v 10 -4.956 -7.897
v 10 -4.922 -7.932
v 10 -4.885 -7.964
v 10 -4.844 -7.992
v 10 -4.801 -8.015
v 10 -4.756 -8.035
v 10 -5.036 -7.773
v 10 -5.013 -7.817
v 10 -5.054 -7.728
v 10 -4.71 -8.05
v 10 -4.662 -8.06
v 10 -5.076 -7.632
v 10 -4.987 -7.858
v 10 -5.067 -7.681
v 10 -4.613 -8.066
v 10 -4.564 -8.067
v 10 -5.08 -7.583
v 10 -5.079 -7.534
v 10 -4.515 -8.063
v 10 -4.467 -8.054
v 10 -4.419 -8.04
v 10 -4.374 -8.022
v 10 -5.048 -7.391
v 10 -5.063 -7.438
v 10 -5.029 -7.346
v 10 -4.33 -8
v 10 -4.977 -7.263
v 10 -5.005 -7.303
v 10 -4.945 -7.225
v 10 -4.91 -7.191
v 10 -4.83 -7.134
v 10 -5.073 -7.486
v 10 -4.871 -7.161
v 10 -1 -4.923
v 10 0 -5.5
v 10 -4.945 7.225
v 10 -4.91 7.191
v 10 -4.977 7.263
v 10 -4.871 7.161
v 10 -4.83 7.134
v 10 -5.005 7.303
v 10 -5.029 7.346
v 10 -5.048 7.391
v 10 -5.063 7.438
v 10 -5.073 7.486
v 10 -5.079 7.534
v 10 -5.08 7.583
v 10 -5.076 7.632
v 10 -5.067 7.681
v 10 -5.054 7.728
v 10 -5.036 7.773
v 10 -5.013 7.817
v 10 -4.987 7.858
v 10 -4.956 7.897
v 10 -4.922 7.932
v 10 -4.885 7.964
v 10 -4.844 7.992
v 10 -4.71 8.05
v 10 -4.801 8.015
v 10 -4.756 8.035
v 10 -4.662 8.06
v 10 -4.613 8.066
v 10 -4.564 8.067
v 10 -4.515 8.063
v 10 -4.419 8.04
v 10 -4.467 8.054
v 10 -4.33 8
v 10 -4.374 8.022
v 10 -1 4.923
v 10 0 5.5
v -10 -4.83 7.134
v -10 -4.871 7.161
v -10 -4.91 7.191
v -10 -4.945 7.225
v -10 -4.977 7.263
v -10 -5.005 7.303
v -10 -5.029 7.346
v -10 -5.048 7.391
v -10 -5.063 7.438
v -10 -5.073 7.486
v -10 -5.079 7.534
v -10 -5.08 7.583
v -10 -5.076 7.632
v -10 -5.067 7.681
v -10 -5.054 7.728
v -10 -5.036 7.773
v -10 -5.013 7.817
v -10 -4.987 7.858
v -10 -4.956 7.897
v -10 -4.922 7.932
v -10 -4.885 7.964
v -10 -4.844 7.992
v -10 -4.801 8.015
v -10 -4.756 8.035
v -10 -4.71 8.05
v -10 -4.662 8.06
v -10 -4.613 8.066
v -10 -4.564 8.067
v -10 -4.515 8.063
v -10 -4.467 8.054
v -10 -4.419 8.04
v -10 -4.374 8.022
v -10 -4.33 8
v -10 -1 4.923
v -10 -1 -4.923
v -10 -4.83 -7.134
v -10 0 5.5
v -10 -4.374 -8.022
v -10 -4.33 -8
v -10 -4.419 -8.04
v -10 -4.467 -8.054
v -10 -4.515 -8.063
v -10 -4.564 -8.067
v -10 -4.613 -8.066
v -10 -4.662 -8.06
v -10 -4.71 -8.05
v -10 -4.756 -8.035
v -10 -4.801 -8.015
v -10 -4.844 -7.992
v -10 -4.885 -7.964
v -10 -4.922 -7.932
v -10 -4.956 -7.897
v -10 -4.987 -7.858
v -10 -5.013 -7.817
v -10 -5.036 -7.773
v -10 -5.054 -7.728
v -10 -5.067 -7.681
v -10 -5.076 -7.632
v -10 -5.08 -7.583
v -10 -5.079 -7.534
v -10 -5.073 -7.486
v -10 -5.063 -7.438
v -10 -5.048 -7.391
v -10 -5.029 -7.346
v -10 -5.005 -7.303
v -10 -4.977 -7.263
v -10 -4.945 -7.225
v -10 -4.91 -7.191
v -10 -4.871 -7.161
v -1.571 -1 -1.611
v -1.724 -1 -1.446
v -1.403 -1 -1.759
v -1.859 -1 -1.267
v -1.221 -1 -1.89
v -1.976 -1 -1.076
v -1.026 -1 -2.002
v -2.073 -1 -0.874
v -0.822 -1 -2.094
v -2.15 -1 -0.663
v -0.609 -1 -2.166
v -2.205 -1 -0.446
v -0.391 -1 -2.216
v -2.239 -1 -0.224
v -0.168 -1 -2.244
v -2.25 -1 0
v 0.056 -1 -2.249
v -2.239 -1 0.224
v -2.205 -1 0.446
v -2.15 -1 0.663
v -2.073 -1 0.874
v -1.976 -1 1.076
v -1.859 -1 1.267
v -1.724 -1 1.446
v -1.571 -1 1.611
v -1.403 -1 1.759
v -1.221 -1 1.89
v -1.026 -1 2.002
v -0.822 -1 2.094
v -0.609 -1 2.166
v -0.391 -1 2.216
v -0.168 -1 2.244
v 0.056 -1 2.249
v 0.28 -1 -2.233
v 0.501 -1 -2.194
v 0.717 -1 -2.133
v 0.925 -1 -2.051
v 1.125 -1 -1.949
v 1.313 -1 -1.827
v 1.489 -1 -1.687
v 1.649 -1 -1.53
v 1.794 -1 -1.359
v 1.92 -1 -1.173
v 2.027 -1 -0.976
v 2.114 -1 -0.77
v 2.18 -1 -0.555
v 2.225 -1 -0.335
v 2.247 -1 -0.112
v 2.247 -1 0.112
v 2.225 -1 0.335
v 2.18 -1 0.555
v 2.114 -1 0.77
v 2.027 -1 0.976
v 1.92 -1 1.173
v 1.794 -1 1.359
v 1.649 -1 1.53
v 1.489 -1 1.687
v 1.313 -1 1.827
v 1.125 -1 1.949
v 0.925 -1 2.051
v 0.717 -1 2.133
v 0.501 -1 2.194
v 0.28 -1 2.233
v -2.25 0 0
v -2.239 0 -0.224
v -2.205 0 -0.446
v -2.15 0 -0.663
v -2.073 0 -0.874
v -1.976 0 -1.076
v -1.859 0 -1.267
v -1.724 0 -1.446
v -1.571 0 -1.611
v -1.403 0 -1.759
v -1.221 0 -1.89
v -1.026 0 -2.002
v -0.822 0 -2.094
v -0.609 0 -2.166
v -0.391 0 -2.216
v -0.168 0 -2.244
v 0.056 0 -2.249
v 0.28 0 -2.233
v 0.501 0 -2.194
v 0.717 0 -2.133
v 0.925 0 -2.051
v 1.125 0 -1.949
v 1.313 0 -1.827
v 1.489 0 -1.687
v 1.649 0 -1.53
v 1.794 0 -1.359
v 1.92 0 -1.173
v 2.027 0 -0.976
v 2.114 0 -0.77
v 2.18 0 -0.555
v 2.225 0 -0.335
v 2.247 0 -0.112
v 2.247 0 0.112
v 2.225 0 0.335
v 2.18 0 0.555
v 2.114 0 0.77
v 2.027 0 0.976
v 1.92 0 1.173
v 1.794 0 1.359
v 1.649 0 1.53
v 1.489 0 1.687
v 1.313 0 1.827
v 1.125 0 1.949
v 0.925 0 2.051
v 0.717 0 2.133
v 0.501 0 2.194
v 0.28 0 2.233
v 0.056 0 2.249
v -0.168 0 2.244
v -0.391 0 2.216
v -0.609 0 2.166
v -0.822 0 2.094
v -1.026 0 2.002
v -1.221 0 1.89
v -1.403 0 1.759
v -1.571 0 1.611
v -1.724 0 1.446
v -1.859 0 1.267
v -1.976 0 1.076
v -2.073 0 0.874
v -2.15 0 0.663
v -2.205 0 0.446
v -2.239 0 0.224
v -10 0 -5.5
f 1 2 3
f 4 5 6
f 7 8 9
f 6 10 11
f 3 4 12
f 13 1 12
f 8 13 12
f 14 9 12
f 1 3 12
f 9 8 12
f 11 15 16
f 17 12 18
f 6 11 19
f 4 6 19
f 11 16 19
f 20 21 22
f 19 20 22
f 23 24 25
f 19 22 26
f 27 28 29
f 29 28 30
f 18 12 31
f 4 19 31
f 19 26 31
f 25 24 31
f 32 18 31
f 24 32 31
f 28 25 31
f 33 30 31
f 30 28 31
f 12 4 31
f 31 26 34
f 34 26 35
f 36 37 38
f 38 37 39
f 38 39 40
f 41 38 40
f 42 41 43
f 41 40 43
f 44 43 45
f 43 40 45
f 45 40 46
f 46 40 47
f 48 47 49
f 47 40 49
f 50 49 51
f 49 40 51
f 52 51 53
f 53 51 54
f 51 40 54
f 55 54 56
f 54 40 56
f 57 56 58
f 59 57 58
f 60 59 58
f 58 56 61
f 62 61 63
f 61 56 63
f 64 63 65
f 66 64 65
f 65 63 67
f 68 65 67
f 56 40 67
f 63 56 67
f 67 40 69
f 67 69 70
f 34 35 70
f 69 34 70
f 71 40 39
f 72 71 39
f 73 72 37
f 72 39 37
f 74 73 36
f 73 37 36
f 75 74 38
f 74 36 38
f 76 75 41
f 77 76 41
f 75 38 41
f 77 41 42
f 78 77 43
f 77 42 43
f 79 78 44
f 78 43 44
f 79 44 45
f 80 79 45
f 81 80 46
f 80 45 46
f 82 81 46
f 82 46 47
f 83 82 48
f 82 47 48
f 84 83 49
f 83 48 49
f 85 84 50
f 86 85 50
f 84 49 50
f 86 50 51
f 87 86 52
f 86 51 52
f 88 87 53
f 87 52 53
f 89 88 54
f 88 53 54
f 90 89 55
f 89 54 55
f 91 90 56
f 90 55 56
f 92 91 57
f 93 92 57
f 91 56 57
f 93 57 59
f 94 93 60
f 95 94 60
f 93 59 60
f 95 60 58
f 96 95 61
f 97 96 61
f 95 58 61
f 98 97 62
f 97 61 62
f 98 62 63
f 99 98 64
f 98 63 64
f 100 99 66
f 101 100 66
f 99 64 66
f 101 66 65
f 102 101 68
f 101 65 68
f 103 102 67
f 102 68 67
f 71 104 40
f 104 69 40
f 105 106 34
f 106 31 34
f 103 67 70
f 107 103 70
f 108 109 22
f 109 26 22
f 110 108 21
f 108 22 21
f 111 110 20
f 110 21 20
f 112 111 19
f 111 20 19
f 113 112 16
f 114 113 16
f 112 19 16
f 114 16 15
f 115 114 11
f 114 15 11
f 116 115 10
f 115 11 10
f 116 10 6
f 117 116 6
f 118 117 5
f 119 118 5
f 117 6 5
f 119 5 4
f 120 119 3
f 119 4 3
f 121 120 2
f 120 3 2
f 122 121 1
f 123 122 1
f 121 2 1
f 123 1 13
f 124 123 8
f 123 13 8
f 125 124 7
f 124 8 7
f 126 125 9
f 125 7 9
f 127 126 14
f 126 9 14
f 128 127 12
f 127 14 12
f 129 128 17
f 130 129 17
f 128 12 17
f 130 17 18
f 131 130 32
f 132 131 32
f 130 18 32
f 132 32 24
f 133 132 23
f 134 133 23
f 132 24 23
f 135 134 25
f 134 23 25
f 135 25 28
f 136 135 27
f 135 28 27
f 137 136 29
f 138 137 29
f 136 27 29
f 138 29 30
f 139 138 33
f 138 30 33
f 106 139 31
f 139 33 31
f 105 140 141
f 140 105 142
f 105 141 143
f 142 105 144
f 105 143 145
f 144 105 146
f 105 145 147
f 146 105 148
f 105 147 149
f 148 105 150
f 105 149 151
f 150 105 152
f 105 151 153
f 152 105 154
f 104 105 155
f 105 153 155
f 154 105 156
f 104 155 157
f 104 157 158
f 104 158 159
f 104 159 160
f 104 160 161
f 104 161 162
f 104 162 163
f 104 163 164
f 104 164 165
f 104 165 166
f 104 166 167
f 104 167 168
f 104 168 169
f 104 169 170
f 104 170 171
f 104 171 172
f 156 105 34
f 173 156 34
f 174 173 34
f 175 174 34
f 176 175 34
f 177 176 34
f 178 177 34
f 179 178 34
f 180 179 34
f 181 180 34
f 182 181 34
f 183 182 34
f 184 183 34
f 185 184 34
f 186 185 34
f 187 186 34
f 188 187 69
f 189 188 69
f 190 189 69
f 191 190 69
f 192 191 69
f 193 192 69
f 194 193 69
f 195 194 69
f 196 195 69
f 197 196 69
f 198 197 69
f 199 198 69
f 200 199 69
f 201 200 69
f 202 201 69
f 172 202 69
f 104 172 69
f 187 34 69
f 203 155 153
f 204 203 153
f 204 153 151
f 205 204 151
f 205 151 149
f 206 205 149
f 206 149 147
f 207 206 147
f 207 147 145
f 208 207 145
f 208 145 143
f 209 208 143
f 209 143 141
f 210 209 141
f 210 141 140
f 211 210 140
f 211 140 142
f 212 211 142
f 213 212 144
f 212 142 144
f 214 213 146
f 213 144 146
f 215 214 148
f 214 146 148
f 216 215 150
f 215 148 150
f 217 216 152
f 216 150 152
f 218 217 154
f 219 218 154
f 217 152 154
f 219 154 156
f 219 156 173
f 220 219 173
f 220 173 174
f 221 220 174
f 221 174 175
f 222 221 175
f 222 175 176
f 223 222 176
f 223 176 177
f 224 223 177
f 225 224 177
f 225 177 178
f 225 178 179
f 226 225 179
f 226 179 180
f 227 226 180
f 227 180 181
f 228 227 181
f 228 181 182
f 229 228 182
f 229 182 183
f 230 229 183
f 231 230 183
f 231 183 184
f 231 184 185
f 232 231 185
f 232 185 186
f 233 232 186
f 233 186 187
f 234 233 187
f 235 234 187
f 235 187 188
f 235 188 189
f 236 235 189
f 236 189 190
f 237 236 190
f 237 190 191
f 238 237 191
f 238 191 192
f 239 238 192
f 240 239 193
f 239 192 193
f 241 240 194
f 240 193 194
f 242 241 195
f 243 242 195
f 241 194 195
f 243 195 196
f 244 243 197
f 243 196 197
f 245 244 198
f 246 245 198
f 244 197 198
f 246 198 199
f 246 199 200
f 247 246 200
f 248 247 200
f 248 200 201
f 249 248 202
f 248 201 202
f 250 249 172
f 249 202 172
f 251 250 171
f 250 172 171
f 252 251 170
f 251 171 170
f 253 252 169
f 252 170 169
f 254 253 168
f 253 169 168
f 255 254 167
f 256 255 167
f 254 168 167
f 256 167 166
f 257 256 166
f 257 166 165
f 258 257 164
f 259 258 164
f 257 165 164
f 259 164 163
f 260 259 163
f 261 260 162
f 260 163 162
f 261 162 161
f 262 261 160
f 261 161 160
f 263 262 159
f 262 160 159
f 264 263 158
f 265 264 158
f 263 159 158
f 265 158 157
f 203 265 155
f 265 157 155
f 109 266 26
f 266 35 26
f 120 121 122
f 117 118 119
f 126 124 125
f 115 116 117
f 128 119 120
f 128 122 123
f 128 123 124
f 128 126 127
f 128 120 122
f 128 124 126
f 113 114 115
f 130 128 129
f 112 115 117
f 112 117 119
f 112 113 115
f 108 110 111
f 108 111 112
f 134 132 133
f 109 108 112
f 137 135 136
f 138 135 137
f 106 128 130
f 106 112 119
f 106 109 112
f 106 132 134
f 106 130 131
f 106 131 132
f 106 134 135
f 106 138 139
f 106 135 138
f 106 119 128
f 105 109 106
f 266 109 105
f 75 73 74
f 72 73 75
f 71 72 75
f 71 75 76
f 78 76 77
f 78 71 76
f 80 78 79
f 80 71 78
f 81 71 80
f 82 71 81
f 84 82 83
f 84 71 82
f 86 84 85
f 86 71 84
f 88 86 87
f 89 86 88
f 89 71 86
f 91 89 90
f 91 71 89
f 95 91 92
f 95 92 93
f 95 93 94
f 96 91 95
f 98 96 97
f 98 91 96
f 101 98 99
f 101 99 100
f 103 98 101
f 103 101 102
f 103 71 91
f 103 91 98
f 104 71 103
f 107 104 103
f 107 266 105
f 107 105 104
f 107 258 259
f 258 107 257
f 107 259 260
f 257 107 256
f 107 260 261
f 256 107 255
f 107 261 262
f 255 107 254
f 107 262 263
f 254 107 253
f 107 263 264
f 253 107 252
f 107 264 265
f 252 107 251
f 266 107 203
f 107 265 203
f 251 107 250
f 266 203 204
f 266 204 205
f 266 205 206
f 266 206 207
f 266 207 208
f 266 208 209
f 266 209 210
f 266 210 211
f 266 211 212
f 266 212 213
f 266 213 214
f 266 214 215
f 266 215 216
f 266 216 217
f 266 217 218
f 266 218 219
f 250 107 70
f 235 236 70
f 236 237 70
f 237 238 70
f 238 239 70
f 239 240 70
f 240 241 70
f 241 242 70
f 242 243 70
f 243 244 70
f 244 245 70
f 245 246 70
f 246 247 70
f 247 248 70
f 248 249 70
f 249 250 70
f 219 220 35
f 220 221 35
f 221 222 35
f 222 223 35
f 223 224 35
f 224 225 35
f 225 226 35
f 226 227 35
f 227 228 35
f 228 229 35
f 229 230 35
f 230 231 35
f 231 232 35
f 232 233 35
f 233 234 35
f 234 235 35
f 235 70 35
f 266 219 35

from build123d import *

# Parameters (mm, degrees)
BOSS_EXTRUDE1_DEPTH  = 10
M4_CLEARANCE_HOLE1_D = 4.5


with BuildPart() as part:
    # Sketch1 → Boss-Extrude1 (new, symmetric)
    with BuildSketch(Plane(origin=(0, 0, 0), x_dir=(0, 0, -1), z_dir=(1, 0, 0))):
        with BuildLine():
            Line((-5.5, 0), (5.5, 0))
            Line((5.5, 0), (8, -4.330127019))
            ThreePointArc((8, -4.330127019), (7.816987298, -5.013139721), (7.133974596, -4.830127019))
            Line((7.133974596, -4.830127019), (4.922649731, -1))
            Line((4.922649731, -1), (-4.922649731, -1))
            Line((-4.922649731, -1), (-7.133974596, -4.830127019))
            ThreePointArc((-7.133974596, -4.830127019), (-7.816987298, -5.013139721), (-8, -4.330127019))
            Line((-8, -4.330127019), (-5.5, 0))
        make_face()
    extrude(amount=BOSS_EXTRUDE1_DEPTH, both=True)

    # M4 Clearance Hole1 (through all)
    with Locations(Plane(origin=(0, 0, 0), x_dir=(1, 0, 0), z_dir=(0, 1, 0))):
        with Locations((0, 0)):
            Hole(M4_CLEARANCE_HOLE1_D / 2)


solid = part.part
